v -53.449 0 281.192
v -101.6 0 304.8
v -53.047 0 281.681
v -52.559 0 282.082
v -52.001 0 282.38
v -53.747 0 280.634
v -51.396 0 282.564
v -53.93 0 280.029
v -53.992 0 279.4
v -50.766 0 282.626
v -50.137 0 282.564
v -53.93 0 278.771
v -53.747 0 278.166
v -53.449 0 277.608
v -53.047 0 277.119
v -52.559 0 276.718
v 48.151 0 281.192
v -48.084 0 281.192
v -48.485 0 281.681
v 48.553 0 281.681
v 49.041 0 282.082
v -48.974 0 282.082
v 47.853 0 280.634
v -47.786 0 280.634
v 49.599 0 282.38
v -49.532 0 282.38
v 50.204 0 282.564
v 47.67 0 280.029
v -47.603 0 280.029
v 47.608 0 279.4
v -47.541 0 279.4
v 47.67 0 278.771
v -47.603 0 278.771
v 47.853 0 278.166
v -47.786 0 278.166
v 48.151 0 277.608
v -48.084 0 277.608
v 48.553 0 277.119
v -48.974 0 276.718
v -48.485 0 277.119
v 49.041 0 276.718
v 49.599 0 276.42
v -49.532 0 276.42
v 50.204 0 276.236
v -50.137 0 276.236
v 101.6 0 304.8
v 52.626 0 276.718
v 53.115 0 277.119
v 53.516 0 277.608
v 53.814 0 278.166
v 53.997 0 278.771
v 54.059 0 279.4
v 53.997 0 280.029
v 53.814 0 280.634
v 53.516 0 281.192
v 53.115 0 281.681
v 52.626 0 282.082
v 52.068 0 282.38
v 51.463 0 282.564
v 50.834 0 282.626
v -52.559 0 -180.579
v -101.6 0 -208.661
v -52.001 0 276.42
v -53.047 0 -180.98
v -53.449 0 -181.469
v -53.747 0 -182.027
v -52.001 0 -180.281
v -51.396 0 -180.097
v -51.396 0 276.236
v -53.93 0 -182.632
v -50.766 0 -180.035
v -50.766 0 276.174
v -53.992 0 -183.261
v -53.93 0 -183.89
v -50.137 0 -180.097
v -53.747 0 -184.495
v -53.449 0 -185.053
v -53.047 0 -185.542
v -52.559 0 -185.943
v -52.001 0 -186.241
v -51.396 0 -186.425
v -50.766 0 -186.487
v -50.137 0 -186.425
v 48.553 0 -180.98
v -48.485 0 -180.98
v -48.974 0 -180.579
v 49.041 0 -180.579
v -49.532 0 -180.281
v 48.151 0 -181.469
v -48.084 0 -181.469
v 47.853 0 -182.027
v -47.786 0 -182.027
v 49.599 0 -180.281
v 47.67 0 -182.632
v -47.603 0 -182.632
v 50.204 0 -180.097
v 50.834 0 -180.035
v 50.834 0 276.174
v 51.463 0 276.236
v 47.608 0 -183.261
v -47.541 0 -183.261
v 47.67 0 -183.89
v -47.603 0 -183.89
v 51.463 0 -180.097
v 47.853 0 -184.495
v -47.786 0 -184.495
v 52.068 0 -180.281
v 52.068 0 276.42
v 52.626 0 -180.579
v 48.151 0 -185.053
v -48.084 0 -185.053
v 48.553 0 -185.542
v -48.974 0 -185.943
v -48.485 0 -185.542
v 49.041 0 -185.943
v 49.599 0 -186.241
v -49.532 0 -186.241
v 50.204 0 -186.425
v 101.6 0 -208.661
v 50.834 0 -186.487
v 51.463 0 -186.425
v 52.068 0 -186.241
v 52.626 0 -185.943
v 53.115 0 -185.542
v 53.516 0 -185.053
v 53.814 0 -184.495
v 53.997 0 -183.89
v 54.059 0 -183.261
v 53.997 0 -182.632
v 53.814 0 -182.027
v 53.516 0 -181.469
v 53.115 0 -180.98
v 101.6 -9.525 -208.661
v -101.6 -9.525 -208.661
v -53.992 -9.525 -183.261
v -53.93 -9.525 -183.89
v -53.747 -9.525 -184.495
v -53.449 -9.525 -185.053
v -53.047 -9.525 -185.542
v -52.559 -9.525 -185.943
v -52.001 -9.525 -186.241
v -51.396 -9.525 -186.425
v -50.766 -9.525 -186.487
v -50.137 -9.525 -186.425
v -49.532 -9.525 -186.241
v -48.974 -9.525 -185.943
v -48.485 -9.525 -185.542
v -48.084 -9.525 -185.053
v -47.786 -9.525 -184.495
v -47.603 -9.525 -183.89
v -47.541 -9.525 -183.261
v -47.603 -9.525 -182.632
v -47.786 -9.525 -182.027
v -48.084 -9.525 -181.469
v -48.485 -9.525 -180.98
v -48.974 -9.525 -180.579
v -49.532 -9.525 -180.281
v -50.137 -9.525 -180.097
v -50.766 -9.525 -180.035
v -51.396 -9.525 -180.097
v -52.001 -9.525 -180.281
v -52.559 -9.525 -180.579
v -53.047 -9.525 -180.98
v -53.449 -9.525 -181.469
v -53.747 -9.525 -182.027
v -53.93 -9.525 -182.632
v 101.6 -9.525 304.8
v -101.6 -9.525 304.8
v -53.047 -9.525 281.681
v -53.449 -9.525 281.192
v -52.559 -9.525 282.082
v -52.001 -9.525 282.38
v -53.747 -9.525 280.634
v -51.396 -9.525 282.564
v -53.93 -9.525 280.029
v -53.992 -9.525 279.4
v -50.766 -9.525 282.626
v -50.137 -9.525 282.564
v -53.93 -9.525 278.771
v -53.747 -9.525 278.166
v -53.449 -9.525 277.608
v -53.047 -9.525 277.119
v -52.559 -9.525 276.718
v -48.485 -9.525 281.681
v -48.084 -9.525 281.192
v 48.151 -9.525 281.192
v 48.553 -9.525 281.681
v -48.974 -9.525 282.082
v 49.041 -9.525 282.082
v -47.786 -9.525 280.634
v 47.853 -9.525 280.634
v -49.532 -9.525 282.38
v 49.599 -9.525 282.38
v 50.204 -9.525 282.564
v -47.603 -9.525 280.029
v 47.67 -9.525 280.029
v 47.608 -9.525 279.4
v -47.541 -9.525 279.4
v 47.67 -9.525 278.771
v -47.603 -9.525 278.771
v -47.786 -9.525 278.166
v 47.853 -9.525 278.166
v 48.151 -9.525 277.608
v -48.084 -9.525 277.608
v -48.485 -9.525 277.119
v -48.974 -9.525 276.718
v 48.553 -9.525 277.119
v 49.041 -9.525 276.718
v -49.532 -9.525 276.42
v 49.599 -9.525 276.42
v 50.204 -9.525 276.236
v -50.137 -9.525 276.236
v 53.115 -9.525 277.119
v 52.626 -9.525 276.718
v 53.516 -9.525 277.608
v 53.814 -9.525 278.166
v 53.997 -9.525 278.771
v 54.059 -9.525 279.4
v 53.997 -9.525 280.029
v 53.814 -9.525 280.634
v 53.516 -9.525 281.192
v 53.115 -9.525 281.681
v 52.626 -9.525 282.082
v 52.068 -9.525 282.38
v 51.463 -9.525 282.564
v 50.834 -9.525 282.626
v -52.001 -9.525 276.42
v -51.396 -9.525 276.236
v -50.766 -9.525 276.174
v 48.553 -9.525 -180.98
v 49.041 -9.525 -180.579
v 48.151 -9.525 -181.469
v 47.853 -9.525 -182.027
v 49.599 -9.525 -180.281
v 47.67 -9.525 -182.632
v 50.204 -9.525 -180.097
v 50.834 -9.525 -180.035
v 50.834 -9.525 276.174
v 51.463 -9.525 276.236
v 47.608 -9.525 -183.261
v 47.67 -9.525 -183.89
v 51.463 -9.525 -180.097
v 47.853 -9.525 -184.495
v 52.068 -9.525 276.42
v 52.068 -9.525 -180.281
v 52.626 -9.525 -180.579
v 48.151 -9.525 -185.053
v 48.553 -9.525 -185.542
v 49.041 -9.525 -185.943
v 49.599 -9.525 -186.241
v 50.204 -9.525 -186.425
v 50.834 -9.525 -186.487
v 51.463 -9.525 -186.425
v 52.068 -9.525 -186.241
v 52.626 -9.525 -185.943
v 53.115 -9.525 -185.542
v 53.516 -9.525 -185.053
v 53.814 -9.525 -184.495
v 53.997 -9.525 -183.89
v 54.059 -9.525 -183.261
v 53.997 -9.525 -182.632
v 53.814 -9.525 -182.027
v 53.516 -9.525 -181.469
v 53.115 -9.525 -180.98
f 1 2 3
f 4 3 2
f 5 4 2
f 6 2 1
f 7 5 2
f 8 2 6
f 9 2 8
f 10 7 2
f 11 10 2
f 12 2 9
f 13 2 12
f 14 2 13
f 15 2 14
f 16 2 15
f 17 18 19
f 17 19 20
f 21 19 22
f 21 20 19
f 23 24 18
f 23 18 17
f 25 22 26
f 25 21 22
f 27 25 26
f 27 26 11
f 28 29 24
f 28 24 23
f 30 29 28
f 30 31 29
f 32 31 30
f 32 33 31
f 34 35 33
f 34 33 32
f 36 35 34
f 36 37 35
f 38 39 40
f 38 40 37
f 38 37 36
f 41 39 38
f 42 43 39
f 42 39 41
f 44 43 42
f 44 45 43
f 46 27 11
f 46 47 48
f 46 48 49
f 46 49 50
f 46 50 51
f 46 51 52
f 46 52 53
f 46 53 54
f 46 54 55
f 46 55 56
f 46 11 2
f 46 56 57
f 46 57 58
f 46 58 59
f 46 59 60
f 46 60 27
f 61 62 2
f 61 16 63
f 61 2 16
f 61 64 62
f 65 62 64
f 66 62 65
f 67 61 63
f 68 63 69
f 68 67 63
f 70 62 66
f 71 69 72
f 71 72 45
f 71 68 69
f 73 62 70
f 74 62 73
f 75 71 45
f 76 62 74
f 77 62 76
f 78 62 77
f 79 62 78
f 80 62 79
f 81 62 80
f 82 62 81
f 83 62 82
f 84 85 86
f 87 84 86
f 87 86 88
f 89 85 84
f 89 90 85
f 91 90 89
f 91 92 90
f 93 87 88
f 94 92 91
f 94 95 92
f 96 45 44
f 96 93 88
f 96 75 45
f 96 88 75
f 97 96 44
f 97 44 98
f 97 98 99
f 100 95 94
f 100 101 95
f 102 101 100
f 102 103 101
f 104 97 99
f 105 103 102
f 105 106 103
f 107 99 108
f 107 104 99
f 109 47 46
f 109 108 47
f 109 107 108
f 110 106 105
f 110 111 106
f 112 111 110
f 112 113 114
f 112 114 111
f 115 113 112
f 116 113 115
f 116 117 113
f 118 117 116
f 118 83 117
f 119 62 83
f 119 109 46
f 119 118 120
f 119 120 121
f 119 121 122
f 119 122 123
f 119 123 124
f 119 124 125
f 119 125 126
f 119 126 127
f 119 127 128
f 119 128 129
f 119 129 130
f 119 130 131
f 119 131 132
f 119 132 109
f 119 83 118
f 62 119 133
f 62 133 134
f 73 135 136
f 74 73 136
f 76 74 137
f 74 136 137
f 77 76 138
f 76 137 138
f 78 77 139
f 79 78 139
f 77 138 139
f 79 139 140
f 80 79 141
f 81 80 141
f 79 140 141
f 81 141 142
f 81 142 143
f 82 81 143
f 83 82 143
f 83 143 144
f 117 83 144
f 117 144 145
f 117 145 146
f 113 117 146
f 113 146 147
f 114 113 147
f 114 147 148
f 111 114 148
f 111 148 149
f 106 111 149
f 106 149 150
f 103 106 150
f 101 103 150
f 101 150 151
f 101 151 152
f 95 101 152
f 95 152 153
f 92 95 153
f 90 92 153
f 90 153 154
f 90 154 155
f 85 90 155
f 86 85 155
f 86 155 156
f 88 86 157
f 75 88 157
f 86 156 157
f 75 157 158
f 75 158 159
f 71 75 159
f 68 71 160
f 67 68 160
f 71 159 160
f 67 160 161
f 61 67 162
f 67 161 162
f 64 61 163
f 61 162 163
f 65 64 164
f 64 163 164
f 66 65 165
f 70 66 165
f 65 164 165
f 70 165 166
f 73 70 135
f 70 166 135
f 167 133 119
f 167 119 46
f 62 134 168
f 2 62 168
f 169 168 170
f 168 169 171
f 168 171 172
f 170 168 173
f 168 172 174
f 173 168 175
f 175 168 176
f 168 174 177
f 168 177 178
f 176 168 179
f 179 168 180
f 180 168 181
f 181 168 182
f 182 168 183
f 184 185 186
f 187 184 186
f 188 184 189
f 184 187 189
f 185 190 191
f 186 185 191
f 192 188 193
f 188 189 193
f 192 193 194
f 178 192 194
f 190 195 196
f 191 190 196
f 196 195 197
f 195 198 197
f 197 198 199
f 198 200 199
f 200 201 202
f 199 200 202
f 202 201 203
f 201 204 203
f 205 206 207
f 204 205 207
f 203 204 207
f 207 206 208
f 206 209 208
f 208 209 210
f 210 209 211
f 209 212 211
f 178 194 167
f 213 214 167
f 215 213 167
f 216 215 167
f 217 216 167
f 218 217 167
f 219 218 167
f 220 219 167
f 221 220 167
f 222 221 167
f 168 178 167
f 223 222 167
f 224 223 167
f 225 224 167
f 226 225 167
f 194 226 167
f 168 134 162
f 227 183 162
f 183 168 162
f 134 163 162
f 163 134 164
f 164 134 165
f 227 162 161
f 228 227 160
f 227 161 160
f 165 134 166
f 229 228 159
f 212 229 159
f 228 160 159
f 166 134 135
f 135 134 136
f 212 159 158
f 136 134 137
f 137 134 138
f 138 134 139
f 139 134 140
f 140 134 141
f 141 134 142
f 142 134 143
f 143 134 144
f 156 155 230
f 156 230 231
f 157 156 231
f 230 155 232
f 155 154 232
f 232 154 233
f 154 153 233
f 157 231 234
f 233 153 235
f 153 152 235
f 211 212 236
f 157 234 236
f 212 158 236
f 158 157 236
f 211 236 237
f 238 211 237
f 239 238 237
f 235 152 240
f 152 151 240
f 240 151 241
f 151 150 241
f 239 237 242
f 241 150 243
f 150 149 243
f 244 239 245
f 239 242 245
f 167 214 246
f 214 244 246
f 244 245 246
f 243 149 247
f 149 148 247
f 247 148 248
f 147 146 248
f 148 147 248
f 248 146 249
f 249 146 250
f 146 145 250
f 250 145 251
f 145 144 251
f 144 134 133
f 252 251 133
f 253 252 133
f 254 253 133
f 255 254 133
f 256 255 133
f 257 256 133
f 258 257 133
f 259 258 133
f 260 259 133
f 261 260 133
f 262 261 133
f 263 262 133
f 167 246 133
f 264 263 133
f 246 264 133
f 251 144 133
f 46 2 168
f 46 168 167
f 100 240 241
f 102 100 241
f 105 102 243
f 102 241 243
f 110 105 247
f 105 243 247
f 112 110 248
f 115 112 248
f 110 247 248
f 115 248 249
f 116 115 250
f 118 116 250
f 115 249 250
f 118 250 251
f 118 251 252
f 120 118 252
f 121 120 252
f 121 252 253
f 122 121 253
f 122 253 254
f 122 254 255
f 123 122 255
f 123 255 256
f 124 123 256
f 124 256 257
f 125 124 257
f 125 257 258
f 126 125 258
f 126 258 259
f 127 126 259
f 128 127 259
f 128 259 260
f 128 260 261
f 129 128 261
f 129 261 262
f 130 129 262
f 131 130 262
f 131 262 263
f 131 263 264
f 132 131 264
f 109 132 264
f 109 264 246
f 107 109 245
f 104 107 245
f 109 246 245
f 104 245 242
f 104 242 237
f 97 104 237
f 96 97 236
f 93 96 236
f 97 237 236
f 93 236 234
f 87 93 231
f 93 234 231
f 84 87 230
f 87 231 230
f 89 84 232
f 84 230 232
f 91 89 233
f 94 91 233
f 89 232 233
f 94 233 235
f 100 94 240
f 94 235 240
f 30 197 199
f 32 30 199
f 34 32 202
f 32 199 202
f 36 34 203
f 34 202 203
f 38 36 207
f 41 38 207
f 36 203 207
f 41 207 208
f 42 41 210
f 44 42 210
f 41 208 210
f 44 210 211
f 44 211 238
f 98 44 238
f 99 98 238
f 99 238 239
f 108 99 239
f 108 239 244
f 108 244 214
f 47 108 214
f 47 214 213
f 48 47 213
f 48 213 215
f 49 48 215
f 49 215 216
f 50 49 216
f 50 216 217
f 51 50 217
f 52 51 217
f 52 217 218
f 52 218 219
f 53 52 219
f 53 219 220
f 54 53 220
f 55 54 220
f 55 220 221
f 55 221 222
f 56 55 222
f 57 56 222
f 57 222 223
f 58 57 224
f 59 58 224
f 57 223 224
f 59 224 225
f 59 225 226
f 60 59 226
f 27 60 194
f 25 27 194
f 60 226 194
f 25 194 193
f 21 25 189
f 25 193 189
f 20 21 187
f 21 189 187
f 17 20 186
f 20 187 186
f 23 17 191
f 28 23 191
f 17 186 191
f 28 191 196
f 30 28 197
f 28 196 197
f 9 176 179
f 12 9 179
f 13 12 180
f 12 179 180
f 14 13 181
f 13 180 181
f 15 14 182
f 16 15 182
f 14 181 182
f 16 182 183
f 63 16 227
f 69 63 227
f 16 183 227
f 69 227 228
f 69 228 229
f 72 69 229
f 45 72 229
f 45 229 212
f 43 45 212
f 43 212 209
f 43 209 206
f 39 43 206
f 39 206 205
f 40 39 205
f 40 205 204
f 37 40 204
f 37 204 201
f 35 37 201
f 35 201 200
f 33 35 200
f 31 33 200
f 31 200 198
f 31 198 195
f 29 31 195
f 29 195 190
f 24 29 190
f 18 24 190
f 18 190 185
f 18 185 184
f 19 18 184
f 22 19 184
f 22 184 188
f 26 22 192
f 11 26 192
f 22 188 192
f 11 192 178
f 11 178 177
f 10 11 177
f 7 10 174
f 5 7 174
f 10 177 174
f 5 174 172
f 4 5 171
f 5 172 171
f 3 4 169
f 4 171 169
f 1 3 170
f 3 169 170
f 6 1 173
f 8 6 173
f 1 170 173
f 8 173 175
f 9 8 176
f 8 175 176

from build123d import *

# Parameters (mm, degrees)
SKETCH3_W           = 304.8
SKETCH3_H           = 609.6
BOSS_EXTRUDE1_DEPTH = 9.525
CUT_EXTRUDE1_DEPTH  = 15.24
SKETCH9_R           = 3.2258
CUT_EXTRUDE3_DEPTH  = 10.525
SKETCH10_W          = 18.645
SKETCH10_H          = 513.461
CUT_EXTRUDE4_DEPTH  = 41.656


with BuildPart() as part:
    # Sketch3 → Boss-Extrude1 (new body)
    with BuildSketch(Plane(origin=(0, 0, 0), x_dir=(1, 0, 0), z_dir=(0, 1, 0))):
        Rectangle(SKETCH3_W, SKETCH3_H)
    extrude(amount=-BOSS_EXTRUDE1_DEPTH)

    # Sketch4 → Cut-Extrude1 (cut)
    with BuildSketch(Plane(origin=(0, 0, 0), x_dir=(1, 0, 0), z_dir=(0, 1, 0))):
        Polygon((-152.4, 304.8), (152.4, 304.8), (152.4, 208.661), (152.4, -304.8), (120.245, -304.8), (120.245, 208.661), (-120.245, 208.661), (-120.245, -304.8), (-152.4, -304.8), (-152.4, 208.661), align=None)
    extrude(amount=-CUT_EXTRUDE1_DEPTH, mode=Mode.SUBTRACT)

    # Sketch9 → Cut-Extrude3 (cut, through all)
    with BuildSketch(Plane(origin=(0, -9.525, 0), x_dir=(-1, 0, 0), z_dir=(0, -1, 0))):
        with Locations((-50.83359, 183.261)):
            Circle(SKETCH9_R)
        with Locations((50.76641, 183.261)):
            Circle(SKETCH9_R)
        with Locations((50.76641, -279.4)):
            Circle(SKETCH9_R)
        with Locations((-50.83359, -279.4)):
            Circle(SKETCH9_R)
    extrude(amount=-CUT_EXTRUDE3_DEPTH, mode=Mode.SUBTRACT)

    # Sketch10 → Cut-Extrude4 (cut)
    with BuildSketch(Plane.XZ.offset(9.525)):
        with Locations((110.9225, 48.0695)):
            Rectangle(SKETCH10_W, SKETCH10_H)
        with Locations((-110.9225, 48.0695)):
            Rectangle(SKETCH10_W, SKETCH10_H)
    extrude(amount=-CUT_EXTRUDE4_DEPTH, mode=Mode.SUBTRACT)


solid = part.part
